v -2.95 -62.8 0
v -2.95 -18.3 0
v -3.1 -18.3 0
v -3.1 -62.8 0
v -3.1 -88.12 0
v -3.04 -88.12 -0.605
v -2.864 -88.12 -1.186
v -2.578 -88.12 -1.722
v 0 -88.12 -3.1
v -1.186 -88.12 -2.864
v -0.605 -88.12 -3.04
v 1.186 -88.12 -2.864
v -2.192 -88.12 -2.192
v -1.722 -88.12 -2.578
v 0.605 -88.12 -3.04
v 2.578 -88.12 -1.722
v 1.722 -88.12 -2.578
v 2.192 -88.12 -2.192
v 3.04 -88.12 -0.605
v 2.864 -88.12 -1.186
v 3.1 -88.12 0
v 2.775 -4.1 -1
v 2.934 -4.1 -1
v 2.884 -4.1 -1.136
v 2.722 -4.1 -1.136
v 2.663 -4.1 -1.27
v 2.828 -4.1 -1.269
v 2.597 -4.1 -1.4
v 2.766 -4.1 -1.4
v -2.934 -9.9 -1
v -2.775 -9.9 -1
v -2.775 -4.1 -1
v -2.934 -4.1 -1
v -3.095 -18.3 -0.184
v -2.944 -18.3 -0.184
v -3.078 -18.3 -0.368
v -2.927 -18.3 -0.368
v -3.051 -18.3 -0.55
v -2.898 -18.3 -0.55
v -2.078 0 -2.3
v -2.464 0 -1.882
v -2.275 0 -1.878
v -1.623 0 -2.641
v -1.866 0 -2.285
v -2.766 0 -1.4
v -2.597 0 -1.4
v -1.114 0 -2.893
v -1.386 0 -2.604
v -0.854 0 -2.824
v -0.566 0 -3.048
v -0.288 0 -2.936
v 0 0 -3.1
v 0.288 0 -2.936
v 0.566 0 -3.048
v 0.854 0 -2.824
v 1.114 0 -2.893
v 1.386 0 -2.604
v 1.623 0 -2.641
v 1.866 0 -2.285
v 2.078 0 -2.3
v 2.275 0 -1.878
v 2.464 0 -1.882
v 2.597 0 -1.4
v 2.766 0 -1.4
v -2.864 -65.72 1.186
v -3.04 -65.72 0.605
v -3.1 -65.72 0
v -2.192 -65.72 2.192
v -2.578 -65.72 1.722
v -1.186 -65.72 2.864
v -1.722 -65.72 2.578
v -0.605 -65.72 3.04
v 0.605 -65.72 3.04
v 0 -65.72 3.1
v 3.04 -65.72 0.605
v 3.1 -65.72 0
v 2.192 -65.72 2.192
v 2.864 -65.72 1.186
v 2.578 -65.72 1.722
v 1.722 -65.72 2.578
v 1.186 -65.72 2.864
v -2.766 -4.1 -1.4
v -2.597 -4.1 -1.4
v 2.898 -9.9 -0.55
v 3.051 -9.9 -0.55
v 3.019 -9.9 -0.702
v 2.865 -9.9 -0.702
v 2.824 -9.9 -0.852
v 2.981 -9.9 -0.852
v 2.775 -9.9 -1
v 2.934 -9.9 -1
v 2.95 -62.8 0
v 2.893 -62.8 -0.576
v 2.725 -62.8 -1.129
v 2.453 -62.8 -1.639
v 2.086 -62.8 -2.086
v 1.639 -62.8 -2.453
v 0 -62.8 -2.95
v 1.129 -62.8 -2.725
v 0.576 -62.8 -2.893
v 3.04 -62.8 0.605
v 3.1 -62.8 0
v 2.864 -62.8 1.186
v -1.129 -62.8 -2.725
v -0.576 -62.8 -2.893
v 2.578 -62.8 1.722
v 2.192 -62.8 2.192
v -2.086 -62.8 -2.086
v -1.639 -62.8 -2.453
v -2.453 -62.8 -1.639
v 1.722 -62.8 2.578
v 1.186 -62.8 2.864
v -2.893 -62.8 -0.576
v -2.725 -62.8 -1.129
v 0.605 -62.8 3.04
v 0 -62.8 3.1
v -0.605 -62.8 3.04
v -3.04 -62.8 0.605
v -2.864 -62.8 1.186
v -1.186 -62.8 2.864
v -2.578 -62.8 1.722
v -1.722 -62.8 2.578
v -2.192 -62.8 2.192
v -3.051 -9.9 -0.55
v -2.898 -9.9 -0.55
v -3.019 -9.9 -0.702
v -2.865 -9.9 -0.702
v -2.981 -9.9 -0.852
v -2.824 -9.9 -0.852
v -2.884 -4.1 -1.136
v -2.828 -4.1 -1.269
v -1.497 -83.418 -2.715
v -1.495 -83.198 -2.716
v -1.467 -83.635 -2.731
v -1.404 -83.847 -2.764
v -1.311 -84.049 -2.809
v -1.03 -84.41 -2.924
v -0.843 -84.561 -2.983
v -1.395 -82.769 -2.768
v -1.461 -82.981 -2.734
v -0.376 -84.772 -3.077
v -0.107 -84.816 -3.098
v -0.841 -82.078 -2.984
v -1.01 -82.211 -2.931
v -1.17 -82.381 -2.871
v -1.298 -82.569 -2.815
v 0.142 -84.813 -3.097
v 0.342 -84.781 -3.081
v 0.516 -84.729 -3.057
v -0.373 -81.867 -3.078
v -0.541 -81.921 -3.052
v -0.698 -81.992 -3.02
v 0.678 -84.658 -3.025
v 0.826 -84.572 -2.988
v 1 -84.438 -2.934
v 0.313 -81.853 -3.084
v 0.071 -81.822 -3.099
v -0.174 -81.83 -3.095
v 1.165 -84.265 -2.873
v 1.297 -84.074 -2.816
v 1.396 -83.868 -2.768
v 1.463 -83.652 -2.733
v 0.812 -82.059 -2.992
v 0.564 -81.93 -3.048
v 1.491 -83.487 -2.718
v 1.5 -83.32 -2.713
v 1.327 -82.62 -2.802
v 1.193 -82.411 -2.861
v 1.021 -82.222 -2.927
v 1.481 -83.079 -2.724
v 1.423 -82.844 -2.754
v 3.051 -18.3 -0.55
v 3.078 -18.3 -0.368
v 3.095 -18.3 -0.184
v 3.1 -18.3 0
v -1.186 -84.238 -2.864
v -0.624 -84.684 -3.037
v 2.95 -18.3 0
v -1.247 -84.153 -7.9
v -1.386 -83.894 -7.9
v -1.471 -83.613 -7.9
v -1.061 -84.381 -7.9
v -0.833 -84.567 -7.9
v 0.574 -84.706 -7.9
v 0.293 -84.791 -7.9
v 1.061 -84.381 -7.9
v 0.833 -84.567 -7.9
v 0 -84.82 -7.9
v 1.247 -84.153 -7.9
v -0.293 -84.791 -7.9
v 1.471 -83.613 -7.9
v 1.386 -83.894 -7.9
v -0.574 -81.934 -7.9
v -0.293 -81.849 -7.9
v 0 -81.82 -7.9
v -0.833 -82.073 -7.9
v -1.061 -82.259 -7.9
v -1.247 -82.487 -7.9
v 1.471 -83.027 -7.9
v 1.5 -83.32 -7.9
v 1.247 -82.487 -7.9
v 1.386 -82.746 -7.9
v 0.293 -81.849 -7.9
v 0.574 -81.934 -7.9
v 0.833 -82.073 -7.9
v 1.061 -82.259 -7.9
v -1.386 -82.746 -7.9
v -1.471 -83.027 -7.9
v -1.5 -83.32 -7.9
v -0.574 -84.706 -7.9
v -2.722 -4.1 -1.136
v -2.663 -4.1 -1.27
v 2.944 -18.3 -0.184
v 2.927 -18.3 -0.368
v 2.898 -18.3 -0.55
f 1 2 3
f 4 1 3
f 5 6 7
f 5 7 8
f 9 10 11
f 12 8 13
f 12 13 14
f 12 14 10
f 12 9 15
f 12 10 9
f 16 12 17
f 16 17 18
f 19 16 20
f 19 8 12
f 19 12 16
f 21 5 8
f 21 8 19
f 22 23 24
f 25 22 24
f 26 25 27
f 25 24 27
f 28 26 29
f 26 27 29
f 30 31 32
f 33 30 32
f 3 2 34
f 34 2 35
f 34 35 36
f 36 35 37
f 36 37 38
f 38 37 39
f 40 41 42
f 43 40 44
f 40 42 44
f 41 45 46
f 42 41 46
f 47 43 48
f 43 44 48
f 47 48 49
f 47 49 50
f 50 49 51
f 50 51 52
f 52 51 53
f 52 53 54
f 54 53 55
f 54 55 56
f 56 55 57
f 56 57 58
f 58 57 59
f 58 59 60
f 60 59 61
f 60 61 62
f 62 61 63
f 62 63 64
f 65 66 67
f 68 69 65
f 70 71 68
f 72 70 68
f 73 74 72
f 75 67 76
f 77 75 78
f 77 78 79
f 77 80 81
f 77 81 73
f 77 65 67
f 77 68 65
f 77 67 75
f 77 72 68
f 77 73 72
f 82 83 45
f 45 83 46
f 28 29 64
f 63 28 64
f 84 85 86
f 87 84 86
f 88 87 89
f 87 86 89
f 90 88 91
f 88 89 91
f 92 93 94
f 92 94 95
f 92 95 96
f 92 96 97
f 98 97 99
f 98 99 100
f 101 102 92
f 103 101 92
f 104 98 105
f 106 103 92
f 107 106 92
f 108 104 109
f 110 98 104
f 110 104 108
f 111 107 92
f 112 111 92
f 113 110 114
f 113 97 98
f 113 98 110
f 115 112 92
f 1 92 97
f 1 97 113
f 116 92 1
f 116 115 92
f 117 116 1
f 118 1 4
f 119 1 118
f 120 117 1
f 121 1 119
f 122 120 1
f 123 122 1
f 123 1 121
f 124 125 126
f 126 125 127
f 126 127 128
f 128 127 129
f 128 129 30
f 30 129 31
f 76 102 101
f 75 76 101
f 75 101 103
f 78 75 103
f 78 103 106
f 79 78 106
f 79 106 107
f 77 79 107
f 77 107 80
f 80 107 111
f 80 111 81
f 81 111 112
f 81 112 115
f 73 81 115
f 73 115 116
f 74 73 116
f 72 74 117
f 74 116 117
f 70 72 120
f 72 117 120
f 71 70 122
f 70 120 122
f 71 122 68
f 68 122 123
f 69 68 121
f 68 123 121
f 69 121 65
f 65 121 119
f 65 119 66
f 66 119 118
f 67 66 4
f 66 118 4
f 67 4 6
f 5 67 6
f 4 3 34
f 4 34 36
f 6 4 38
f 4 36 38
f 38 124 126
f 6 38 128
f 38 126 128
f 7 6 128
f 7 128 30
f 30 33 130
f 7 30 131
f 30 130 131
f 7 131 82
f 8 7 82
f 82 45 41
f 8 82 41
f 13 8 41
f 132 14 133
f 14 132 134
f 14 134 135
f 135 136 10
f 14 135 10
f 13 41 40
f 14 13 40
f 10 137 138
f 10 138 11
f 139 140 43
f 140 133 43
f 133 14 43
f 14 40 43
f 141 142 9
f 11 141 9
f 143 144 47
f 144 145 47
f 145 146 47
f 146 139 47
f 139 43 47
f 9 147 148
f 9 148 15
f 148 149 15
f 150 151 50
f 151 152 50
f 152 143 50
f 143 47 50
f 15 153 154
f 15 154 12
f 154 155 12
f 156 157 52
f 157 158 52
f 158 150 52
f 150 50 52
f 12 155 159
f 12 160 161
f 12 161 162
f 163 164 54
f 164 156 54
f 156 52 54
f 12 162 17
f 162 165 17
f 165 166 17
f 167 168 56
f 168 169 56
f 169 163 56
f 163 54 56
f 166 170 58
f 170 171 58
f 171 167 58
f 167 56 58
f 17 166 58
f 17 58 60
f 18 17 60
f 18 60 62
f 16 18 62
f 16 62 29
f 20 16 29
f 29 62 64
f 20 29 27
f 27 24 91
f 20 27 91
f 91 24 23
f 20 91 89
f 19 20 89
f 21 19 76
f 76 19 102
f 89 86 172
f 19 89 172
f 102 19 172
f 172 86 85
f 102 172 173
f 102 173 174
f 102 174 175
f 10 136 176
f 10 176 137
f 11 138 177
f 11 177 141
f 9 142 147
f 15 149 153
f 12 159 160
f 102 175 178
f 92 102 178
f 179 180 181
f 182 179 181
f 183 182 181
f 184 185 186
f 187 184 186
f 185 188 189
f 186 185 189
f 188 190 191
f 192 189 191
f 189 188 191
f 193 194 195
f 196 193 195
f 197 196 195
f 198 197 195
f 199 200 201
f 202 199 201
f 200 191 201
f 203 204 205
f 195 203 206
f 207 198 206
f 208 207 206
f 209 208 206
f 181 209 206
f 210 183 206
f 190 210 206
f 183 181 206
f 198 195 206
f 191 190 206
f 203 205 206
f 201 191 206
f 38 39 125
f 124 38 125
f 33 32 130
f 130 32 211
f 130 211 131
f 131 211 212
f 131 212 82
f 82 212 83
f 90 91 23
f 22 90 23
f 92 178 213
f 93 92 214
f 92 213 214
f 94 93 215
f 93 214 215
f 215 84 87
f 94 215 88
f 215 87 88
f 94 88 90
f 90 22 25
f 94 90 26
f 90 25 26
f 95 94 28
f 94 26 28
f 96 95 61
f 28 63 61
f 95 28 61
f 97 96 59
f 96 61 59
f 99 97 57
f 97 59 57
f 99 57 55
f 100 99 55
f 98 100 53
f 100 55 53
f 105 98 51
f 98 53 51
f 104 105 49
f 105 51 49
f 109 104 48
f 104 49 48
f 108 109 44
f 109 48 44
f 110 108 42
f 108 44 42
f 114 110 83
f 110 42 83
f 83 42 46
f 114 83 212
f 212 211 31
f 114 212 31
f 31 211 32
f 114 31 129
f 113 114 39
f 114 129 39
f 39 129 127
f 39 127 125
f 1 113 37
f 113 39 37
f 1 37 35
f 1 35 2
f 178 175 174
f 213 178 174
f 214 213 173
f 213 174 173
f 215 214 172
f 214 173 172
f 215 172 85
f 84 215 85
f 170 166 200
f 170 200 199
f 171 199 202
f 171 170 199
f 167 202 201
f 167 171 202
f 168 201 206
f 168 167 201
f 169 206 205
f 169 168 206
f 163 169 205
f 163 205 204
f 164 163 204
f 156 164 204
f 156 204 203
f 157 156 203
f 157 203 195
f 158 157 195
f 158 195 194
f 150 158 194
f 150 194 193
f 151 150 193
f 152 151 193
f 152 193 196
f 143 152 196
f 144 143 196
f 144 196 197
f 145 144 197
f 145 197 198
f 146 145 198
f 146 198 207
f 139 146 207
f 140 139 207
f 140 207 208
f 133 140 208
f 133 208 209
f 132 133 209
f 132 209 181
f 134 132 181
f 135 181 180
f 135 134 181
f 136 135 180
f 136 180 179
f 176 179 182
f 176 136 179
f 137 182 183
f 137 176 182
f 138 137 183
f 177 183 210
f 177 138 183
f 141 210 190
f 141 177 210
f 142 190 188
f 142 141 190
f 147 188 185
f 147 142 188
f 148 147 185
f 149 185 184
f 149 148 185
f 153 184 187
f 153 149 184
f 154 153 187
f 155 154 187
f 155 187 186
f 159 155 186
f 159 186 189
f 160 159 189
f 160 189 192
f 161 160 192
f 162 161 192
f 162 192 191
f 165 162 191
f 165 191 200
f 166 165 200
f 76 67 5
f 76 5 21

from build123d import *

# Parameters (mm, degrees)
F0_R      = 3.1
F1_DEPTH  = 88.12
F3_DEPTH  = 22.4
F5_DEPTH  = 62.8
F6_R      = 2.95
F7_DEPTH  = 62.8
F9_DEPTH  = 12.5
F10_R     = 1.5
F11_DEPTH = 7.9


with BuildPart() as f1:
    # F0 (on Front) → F1 (new body)
    with BuildSketch(Plane.XZ):
        Circle(F0_R)
    extrude(amount=F1_DEPTH)

    # F2 (on face) → F3 (cut)
    with BuildSketch(Plane.XZ.offset(88.12)):
        with BuildLine():
            ThreePointArc((3.1, 0), (0, 3.1), (-3.1, 0))
            Line((-3.1, 0), (3.1, 0))
        make_face()
    extrude(amount=-F3_DEPTH, mode=Mode.SUBTRACT)

    # F4 (on face) → F5 (cut)
    with BuildSketch(Plane(origin=(0, 0, 0), x_dir=(-1, 0, 0), z_dir=(0, 1, 0))):
        with BuildLine():
            ThreePointArc((3.1, 0), (0, 3.1), (-3.1, 0))
            Line((-3.1, 0), (3.1, 0))
        make_face()
    extrude(amount=-F5_DEPTH, mode=Mode.SUBTRACT)

    # F6 (on face) → F7 (cut)
    with BuildSketch(Plane(origin=(0, 0, 0), x_dir=(-1, 0, 0), z_dir=(0, 1, 0))):
        Circle(F6_R)
    extrude(amount=-F7_DEPTH, mode=Mode.SUBTRACT)

    # F8 (on Right) → F9 (cut, symmetric)
    with BuildSketch(Plane.YZ):
        Polygon((0, 0), (-18.3, 0), (-18.3, -0.55), (-9.9, -0.55), (-9.9, -1), (-4.1, -1), (-4.1, -1.4), (0, -1.4), align=None)
    extrude(amount=F9_DEPTH, both=True, mode=Mode.SUBTRACT)

    # F10 (on face) → F11 (join)
    with BuildSketch(Plane.XY):
        with Locations((0, -83.32)):
            Circle(F10_R)
    extrude(amount=-F11_DEPTH)


solid = f1.part
